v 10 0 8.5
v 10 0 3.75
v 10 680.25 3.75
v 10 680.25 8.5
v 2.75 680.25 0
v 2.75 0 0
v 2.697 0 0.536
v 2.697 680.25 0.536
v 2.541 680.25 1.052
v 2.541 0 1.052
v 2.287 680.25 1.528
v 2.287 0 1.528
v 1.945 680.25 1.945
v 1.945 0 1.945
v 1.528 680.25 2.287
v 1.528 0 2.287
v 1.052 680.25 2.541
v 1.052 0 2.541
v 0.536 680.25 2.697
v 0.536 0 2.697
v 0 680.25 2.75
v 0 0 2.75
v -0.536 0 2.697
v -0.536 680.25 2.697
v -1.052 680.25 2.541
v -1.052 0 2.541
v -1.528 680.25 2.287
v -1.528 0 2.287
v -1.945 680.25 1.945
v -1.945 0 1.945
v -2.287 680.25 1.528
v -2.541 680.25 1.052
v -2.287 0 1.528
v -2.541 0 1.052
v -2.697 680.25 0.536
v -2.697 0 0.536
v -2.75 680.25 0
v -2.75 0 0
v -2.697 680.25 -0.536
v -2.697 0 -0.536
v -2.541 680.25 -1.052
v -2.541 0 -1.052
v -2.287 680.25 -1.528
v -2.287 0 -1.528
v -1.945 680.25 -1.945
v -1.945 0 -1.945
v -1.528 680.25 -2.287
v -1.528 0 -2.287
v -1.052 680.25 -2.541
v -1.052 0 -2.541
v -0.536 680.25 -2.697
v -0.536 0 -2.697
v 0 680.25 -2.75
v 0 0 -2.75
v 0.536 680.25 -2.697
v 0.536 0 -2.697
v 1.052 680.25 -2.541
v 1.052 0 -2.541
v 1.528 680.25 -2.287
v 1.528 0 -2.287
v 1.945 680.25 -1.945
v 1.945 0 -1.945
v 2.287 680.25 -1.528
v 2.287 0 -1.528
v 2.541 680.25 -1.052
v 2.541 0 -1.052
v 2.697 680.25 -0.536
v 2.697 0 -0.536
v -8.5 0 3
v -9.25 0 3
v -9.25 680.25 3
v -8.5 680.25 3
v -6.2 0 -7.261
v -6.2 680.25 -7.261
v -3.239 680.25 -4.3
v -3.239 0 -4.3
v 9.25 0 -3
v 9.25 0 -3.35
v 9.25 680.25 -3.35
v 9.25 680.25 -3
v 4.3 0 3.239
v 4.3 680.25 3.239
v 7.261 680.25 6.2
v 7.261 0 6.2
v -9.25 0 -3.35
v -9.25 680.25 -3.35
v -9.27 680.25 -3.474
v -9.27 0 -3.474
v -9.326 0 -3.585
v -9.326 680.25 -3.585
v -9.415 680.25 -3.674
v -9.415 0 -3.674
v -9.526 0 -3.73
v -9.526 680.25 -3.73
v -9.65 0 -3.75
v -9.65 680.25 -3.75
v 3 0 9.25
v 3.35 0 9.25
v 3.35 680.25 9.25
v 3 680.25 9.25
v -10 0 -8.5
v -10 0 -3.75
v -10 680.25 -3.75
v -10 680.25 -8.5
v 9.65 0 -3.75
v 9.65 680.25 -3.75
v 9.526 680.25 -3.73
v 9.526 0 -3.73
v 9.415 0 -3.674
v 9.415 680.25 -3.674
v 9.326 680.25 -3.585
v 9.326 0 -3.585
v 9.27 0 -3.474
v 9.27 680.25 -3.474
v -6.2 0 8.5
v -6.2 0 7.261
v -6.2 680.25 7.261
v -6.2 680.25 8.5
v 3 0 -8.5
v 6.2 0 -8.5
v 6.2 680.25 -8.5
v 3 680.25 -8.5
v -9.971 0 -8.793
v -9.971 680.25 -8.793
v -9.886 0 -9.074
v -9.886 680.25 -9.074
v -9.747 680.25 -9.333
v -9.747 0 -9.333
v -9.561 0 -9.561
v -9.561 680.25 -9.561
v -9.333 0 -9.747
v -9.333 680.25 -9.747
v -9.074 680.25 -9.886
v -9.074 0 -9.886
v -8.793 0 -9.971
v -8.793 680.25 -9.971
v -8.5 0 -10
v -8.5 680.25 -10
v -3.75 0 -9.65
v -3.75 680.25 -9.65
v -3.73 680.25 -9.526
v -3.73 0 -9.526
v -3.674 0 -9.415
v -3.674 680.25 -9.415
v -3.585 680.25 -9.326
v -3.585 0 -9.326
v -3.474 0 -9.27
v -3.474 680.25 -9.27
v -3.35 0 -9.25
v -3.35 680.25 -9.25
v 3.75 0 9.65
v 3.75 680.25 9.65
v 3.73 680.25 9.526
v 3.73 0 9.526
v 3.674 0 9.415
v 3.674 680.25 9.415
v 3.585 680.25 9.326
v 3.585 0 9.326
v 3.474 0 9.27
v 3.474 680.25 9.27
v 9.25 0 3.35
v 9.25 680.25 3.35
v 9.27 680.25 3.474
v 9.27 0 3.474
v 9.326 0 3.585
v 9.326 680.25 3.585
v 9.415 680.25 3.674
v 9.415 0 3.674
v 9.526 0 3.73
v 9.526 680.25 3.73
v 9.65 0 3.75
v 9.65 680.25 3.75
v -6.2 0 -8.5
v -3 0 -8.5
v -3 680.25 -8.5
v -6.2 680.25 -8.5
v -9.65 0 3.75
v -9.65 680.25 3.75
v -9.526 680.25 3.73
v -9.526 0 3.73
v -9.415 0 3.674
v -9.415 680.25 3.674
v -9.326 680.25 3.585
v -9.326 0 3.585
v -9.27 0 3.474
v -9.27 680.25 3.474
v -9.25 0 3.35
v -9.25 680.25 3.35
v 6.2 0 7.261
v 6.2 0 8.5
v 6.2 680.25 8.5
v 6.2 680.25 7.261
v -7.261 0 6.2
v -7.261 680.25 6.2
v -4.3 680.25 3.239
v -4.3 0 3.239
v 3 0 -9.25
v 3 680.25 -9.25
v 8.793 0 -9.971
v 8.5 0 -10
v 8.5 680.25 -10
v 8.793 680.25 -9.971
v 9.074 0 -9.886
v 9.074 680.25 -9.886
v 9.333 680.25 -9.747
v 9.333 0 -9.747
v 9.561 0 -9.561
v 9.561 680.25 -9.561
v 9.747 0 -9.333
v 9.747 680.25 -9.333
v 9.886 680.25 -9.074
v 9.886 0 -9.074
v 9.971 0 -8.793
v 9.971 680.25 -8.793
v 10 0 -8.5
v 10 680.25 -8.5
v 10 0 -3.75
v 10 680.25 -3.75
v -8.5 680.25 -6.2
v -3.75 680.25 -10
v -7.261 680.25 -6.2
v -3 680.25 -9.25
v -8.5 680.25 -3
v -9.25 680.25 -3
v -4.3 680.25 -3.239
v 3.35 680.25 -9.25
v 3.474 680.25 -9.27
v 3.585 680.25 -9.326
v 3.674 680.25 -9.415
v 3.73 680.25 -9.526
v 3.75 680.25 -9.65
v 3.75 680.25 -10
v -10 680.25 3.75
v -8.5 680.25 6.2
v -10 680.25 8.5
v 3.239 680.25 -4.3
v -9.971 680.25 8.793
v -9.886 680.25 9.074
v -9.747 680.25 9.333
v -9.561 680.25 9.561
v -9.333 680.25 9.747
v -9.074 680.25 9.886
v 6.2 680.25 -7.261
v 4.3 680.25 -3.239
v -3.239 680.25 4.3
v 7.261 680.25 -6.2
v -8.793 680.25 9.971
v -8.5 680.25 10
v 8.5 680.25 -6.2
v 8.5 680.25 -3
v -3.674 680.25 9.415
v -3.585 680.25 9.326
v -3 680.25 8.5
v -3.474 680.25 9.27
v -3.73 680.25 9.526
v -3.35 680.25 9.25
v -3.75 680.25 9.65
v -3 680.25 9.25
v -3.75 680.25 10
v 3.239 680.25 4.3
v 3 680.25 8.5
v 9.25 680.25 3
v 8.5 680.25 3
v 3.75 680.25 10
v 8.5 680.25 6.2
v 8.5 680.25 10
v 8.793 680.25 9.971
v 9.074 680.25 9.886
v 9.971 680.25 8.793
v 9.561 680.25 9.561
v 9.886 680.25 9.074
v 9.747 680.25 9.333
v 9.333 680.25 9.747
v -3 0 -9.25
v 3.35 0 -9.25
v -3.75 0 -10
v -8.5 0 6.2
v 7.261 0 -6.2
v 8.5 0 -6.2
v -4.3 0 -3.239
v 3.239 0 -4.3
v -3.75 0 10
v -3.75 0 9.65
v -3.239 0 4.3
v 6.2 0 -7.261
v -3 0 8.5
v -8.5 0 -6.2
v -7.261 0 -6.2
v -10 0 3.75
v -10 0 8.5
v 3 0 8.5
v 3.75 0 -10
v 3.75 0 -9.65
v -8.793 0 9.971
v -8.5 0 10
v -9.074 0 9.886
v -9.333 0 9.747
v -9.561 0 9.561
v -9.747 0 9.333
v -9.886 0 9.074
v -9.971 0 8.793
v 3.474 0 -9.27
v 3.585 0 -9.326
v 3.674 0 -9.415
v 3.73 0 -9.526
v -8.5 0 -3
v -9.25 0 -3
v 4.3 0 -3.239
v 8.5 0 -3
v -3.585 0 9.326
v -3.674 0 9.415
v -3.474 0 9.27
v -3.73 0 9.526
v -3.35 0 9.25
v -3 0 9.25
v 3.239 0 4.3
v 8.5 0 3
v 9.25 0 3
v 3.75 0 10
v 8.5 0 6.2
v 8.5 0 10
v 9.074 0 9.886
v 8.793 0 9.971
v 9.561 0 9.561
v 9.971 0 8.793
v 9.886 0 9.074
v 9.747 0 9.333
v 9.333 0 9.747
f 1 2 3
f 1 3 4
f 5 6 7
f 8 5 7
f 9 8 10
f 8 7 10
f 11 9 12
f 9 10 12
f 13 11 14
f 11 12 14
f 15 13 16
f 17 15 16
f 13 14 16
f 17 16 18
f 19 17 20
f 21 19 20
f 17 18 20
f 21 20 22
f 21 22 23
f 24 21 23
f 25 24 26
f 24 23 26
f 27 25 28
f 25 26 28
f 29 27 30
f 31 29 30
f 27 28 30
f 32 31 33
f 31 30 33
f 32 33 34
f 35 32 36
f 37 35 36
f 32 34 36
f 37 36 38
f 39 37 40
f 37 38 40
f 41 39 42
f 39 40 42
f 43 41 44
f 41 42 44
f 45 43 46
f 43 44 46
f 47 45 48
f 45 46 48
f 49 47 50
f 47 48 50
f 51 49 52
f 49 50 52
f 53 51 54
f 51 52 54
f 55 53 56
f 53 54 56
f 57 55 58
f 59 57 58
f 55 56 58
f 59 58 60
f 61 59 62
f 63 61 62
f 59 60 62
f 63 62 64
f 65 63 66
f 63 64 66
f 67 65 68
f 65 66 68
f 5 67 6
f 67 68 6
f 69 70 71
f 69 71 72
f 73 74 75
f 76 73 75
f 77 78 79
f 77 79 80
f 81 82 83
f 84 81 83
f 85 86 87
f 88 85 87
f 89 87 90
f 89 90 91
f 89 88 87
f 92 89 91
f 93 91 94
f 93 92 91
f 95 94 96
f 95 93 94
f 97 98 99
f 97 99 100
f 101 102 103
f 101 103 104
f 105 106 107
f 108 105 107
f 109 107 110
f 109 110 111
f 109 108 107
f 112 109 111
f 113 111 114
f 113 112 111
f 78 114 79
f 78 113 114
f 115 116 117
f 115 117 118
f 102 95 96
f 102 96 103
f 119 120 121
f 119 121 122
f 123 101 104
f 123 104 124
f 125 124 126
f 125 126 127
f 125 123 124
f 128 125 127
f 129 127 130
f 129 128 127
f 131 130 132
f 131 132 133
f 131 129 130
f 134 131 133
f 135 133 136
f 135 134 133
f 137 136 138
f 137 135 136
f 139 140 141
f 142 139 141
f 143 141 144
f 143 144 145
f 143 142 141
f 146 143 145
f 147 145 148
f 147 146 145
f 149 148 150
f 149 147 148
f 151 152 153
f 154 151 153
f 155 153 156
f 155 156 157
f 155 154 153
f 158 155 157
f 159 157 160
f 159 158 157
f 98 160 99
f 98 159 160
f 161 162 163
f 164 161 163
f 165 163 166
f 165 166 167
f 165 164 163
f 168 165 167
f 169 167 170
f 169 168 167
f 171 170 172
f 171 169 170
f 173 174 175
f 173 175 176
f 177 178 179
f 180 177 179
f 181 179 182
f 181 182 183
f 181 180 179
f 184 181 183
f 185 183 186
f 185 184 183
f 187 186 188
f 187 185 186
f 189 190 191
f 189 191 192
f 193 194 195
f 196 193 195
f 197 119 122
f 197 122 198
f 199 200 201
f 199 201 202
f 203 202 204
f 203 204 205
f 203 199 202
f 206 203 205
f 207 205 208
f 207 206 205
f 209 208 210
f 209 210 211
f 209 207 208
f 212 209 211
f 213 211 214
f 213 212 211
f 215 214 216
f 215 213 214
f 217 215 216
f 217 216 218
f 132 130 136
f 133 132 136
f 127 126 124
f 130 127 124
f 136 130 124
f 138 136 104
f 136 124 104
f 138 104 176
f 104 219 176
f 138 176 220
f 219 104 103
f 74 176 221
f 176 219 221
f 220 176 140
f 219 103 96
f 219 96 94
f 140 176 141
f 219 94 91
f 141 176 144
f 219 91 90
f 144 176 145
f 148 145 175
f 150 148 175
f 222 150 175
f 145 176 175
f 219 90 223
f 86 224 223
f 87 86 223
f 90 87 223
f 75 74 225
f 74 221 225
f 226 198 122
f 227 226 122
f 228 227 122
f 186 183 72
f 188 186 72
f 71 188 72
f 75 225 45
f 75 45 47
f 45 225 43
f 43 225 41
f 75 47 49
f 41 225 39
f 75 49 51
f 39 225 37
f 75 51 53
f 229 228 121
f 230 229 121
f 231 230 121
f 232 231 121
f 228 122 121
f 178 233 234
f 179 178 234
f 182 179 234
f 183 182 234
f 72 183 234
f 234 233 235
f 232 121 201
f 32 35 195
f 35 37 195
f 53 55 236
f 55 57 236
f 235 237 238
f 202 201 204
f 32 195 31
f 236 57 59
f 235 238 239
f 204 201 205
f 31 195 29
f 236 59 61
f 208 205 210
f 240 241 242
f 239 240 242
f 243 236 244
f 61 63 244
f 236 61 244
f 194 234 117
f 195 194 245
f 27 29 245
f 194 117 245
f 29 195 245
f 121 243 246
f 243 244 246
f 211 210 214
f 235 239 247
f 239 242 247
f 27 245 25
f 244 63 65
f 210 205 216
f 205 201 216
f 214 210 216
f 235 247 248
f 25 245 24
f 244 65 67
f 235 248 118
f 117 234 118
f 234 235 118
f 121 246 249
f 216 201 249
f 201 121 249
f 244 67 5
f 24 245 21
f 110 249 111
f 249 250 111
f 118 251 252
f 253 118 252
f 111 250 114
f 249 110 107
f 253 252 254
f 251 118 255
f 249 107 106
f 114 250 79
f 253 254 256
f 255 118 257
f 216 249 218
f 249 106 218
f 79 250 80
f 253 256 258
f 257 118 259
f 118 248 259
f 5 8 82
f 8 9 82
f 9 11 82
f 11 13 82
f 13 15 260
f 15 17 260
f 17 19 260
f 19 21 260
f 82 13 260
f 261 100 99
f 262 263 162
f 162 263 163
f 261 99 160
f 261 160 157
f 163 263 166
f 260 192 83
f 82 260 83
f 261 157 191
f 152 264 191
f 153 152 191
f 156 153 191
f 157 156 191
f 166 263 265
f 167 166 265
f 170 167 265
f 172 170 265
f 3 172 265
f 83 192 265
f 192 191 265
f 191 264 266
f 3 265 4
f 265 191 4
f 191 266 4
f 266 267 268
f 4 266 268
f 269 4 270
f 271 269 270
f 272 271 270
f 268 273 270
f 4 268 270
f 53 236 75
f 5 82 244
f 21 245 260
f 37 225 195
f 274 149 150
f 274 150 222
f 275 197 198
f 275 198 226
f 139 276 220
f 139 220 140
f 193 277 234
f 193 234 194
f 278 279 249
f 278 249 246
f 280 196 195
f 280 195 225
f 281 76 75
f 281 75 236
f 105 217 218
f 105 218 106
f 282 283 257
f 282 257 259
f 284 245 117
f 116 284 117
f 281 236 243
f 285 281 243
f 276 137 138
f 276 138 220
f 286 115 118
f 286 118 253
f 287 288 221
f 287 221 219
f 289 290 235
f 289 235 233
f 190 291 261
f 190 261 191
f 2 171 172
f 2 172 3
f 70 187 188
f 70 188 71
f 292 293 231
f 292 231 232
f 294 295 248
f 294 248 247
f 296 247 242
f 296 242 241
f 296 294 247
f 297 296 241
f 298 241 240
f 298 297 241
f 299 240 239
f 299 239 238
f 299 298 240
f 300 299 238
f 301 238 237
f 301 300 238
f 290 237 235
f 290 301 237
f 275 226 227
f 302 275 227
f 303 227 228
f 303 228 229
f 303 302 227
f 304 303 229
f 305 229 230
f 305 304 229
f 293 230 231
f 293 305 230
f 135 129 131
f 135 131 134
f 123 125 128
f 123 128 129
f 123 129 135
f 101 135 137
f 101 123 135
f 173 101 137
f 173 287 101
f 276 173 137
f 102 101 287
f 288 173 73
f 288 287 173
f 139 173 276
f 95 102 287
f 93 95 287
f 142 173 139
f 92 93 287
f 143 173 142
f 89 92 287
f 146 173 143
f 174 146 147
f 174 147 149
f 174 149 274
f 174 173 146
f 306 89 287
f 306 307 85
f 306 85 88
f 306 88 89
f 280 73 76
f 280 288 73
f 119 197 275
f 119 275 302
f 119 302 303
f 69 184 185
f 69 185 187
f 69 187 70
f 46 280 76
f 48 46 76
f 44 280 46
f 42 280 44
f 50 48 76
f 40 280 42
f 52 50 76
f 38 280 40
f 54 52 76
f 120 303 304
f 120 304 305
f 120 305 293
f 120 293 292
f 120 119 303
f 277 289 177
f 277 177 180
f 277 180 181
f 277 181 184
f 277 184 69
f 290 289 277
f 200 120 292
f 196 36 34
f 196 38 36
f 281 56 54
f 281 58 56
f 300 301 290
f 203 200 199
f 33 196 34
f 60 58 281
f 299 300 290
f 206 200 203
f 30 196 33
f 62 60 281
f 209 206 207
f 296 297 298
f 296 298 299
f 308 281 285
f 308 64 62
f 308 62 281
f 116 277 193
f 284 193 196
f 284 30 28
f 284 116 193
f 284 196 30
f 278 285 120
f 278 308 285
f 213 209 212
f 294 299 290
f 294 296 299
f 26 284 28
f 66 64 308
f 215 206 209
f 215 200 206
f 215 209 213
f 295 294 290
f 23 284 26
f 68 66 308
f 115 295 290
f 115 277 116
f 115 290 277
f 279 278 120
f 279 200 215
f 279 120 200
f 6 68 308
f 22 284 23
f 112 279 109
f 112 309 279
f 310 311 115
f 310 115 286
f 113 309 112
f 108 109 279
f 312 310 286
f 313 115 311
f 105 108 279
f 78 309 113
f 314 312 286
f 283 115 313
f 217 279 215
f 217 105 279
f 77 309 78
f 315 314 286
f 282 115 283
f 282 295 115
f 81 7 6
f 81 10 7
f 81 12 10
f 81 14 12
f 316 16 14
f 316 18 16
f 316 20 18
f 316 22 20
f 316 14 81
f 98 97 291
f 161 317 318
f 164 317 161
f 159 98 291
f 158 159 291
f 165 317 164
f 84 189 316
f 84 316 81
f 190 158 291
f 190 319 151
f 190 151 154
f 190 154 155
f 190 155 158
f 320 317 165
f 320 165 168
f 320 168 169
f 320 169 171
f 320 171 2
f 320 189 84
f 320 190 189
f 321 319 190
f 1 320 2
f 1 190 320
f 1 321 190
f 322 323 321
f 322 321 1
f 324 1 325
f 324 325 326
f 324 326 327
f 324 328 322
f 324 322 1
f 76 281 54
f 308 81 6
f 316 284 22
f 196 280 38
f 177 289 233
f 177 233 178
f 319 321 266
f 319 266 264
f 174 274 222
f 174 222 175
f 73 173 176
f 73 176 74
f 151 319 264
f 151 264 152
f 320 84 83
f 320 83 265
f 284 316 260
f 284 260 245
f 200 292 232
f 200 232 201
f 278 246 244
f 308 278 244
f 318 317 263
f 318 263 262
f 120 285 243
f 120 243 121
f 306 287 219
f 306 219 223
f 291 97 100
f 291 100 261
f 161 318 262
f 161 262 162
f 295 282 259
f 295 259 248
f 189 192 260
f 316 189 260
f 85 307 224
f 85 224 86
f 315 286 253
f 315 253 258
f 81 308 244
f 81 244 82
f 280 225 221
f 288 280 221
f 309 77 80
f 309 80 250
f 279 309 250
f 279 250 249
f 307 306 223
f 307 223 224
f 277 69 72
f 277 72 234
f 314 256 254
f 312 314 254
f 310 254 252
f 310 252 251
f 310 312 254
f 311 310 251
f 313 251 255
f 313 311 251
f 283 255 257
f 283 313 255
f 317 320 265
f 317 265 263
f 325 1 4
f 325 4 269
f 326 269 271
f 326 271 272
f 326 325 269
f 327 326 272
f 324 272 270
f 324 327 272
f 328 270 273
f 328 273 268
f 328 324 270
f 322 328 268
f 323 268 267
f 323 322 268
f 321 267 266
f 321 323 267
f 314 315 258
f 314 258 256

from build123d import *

# Parameters (mm, degrees)
SKETCH1_R           = 2.75
BOSS_EXTRUDE1_DEPTH = 680.25


with BuildPart() as part:
    # Sketch1 → Boss-Extrude1 (new body)
    with BuildSketch(Plane.XZ):
        with BuildLine():
            Line((-8.5, -10), (-3.75, -10))
            Line((-3.75, -10), (-3.75, -9.65))
            ThreePointArc((-3.75, -9.65), (-3.632842712, -9.367157288), (-3.35, -9.25))
            Line((-3.35, -9.25), (-3, -9.25))
            Line((-3, -9.25), (-3, -8.5))
            Line((-3, -8.5), (-6.2, -8.5))
            Line((-6.2, -8.5), (-6.2, -7.260660172))
            Line((-6.2, -7.260660172), (-3.239339828, -4.3))
            Line((-3.239339828, -4.3), (3.239339828, -4.3))
            Line((3.239339828, -4.3), (6.2, -7.260660172))
            Line((6.2, -7.260660172), (6.2, -8.5))
            Line((6.2, -8.5), (3, -8.5))
            Line((3, -8.5), (3, -9.25))
            Line((3, -9.25), (3.35, -9.25))
            ThreePointArc((3.35, -9.25), (3.632842712, -9.367157288), (3.75, -9.65))
            Line((3.75, -9.65), (3.75, -10))
            Line((3.75, -10), (8.5, -10))
            ThreePointArc((8.5, -10), (9.560660172, -9.560660172), (10, -8.5))
            Line((10, -8.5), (10, -3.75))
            Line((10, -3.75), (9.65, -3.75))
            ThreePointArc((9.65, -3.75), (9.367157288, -3.632842712), (9.25, -3.35))
            Line((9.25, -3.35), (9.25, -3))
            Line((9.25, -3), (8.5, -3))
            Line((8.5, -3), (8.5, -6.2))
            Line((8.5, -6.2), (7.260660172, -6.2))
            Line((7.260660172, -6.2), (4.3, -3.239339828))
            Line((4.3, -3.239339828), (4.3, 3.239339828))
            Line((4.3, 3.239339828), (7.260660172, 6.2))
            Line((7.260660172, 6.2), (8.5, 6.2))
            Line((8.5, 6.2), (8.5, 3))
            Line((8.5, 3), (9.25, 3))
            Line((9.25, 3), (9.25, 3.35))
            ThreePointArc((9.25, 3.35), (9.367157288, 3.632842712), (9.65, 3.75))
            Line((9.65, 3.75), (10, 3.75))
            Line((10, 3.75), (10, 8.5))
            ThreePointArc((10, 8.5), (9.560660172, 9.560660172), (8.5, 10))
            Line((8.5, 10), (3.75, 10))
            Line((3.75, 10), (3.75, 9.65))
            ThreePointArc((3.75, 9.65), (3.632842712, 9.367157288), (3.35, 9.25))
            Line((3.35, 9.25), (3, 9.25))
            Line((3, 9.25), (3, 8.5))
            Line((3, 8.5), (6.2, 8.5))
            Line((6.2, 8.5), (6.2, 7.260660172))
            Line((6.2, 7.260660172), (3.239339828, 4.3))
            Line((3.239339828, 4.3), (-3.239339828, 4.3))
            Line((-3.239339828, 4.3), (-6.2, 7.260660172))
            Line((-6.2, 7.260660172), (-6.2, 8.5))
            Line((-6.2, 8.5), (-3, 8.5))
            Line((-3, 8.5), (-3, 9.25))
            Line((-3, 9.25), (-3.35, 9.25))
            ThreePointArc((-3.35, 9.25), (-3.632842712, 9.367157288), (-3.75, 9.65))
            Line((-3.75, 9.65), (-3.75, 10))
            Line((-3.75, 10), (-8.5, 10))
            ThreePointArc((-8.5, 10), (-9.560660172, 9.560660172), (-10, 8.5))
            Line((-10, 8.5), (-10, 3.75))
            Line((-10, 3.75), (-9.65, 3.75))
            ThreePointArc((-9.65, 3.75), (-9.367157288, 3.632842712), (-9.25, 3.35))
            Line((-9.25, 3.35), (-9.25, 3))
            Line((-9.25, 3), (-8.5, 3))
            Line((-8.5, 3), (-8.5, 6.2))
            Line((-8.5, 6.2), (-7.260660172, 6.2))
            Line((-7.260660172, 6.2), (-4.3, 3.239339828))
            Line((-4.3, 3.239339828), (-4.3, -3.239339828))
            Line((-4.3, -3.239339828), (-7.260660172, -6.2))
            Line((-7.260660172, -6.2), (-8.5, -6.2))
            Line((-8.5, -6.2), (-8.5, -3))
            Line((-8.5, -3), (-9.25, -3))
            Line((-9.25, -3), (-9.25, -3.35))
            ThreePointArc((-9.25, -3.35), (-9.367157288, -3.632842712), (-9.65, -3.75))
            Line((-9.65, -3.75), (-10, -3.75))
            Line((-10, -3.75), (-10, -8.5))
            ThreePointArc((-10, -8.5), (-9.560660172, -9.560660172), (-8.5, -10))
        make_face()
        Circle(SKETCH1_R, mode=Mode.SUBTRACT)
    extrude(amount=-BOSS_EXTRUDE1_DEPTH)


solid = part.part
